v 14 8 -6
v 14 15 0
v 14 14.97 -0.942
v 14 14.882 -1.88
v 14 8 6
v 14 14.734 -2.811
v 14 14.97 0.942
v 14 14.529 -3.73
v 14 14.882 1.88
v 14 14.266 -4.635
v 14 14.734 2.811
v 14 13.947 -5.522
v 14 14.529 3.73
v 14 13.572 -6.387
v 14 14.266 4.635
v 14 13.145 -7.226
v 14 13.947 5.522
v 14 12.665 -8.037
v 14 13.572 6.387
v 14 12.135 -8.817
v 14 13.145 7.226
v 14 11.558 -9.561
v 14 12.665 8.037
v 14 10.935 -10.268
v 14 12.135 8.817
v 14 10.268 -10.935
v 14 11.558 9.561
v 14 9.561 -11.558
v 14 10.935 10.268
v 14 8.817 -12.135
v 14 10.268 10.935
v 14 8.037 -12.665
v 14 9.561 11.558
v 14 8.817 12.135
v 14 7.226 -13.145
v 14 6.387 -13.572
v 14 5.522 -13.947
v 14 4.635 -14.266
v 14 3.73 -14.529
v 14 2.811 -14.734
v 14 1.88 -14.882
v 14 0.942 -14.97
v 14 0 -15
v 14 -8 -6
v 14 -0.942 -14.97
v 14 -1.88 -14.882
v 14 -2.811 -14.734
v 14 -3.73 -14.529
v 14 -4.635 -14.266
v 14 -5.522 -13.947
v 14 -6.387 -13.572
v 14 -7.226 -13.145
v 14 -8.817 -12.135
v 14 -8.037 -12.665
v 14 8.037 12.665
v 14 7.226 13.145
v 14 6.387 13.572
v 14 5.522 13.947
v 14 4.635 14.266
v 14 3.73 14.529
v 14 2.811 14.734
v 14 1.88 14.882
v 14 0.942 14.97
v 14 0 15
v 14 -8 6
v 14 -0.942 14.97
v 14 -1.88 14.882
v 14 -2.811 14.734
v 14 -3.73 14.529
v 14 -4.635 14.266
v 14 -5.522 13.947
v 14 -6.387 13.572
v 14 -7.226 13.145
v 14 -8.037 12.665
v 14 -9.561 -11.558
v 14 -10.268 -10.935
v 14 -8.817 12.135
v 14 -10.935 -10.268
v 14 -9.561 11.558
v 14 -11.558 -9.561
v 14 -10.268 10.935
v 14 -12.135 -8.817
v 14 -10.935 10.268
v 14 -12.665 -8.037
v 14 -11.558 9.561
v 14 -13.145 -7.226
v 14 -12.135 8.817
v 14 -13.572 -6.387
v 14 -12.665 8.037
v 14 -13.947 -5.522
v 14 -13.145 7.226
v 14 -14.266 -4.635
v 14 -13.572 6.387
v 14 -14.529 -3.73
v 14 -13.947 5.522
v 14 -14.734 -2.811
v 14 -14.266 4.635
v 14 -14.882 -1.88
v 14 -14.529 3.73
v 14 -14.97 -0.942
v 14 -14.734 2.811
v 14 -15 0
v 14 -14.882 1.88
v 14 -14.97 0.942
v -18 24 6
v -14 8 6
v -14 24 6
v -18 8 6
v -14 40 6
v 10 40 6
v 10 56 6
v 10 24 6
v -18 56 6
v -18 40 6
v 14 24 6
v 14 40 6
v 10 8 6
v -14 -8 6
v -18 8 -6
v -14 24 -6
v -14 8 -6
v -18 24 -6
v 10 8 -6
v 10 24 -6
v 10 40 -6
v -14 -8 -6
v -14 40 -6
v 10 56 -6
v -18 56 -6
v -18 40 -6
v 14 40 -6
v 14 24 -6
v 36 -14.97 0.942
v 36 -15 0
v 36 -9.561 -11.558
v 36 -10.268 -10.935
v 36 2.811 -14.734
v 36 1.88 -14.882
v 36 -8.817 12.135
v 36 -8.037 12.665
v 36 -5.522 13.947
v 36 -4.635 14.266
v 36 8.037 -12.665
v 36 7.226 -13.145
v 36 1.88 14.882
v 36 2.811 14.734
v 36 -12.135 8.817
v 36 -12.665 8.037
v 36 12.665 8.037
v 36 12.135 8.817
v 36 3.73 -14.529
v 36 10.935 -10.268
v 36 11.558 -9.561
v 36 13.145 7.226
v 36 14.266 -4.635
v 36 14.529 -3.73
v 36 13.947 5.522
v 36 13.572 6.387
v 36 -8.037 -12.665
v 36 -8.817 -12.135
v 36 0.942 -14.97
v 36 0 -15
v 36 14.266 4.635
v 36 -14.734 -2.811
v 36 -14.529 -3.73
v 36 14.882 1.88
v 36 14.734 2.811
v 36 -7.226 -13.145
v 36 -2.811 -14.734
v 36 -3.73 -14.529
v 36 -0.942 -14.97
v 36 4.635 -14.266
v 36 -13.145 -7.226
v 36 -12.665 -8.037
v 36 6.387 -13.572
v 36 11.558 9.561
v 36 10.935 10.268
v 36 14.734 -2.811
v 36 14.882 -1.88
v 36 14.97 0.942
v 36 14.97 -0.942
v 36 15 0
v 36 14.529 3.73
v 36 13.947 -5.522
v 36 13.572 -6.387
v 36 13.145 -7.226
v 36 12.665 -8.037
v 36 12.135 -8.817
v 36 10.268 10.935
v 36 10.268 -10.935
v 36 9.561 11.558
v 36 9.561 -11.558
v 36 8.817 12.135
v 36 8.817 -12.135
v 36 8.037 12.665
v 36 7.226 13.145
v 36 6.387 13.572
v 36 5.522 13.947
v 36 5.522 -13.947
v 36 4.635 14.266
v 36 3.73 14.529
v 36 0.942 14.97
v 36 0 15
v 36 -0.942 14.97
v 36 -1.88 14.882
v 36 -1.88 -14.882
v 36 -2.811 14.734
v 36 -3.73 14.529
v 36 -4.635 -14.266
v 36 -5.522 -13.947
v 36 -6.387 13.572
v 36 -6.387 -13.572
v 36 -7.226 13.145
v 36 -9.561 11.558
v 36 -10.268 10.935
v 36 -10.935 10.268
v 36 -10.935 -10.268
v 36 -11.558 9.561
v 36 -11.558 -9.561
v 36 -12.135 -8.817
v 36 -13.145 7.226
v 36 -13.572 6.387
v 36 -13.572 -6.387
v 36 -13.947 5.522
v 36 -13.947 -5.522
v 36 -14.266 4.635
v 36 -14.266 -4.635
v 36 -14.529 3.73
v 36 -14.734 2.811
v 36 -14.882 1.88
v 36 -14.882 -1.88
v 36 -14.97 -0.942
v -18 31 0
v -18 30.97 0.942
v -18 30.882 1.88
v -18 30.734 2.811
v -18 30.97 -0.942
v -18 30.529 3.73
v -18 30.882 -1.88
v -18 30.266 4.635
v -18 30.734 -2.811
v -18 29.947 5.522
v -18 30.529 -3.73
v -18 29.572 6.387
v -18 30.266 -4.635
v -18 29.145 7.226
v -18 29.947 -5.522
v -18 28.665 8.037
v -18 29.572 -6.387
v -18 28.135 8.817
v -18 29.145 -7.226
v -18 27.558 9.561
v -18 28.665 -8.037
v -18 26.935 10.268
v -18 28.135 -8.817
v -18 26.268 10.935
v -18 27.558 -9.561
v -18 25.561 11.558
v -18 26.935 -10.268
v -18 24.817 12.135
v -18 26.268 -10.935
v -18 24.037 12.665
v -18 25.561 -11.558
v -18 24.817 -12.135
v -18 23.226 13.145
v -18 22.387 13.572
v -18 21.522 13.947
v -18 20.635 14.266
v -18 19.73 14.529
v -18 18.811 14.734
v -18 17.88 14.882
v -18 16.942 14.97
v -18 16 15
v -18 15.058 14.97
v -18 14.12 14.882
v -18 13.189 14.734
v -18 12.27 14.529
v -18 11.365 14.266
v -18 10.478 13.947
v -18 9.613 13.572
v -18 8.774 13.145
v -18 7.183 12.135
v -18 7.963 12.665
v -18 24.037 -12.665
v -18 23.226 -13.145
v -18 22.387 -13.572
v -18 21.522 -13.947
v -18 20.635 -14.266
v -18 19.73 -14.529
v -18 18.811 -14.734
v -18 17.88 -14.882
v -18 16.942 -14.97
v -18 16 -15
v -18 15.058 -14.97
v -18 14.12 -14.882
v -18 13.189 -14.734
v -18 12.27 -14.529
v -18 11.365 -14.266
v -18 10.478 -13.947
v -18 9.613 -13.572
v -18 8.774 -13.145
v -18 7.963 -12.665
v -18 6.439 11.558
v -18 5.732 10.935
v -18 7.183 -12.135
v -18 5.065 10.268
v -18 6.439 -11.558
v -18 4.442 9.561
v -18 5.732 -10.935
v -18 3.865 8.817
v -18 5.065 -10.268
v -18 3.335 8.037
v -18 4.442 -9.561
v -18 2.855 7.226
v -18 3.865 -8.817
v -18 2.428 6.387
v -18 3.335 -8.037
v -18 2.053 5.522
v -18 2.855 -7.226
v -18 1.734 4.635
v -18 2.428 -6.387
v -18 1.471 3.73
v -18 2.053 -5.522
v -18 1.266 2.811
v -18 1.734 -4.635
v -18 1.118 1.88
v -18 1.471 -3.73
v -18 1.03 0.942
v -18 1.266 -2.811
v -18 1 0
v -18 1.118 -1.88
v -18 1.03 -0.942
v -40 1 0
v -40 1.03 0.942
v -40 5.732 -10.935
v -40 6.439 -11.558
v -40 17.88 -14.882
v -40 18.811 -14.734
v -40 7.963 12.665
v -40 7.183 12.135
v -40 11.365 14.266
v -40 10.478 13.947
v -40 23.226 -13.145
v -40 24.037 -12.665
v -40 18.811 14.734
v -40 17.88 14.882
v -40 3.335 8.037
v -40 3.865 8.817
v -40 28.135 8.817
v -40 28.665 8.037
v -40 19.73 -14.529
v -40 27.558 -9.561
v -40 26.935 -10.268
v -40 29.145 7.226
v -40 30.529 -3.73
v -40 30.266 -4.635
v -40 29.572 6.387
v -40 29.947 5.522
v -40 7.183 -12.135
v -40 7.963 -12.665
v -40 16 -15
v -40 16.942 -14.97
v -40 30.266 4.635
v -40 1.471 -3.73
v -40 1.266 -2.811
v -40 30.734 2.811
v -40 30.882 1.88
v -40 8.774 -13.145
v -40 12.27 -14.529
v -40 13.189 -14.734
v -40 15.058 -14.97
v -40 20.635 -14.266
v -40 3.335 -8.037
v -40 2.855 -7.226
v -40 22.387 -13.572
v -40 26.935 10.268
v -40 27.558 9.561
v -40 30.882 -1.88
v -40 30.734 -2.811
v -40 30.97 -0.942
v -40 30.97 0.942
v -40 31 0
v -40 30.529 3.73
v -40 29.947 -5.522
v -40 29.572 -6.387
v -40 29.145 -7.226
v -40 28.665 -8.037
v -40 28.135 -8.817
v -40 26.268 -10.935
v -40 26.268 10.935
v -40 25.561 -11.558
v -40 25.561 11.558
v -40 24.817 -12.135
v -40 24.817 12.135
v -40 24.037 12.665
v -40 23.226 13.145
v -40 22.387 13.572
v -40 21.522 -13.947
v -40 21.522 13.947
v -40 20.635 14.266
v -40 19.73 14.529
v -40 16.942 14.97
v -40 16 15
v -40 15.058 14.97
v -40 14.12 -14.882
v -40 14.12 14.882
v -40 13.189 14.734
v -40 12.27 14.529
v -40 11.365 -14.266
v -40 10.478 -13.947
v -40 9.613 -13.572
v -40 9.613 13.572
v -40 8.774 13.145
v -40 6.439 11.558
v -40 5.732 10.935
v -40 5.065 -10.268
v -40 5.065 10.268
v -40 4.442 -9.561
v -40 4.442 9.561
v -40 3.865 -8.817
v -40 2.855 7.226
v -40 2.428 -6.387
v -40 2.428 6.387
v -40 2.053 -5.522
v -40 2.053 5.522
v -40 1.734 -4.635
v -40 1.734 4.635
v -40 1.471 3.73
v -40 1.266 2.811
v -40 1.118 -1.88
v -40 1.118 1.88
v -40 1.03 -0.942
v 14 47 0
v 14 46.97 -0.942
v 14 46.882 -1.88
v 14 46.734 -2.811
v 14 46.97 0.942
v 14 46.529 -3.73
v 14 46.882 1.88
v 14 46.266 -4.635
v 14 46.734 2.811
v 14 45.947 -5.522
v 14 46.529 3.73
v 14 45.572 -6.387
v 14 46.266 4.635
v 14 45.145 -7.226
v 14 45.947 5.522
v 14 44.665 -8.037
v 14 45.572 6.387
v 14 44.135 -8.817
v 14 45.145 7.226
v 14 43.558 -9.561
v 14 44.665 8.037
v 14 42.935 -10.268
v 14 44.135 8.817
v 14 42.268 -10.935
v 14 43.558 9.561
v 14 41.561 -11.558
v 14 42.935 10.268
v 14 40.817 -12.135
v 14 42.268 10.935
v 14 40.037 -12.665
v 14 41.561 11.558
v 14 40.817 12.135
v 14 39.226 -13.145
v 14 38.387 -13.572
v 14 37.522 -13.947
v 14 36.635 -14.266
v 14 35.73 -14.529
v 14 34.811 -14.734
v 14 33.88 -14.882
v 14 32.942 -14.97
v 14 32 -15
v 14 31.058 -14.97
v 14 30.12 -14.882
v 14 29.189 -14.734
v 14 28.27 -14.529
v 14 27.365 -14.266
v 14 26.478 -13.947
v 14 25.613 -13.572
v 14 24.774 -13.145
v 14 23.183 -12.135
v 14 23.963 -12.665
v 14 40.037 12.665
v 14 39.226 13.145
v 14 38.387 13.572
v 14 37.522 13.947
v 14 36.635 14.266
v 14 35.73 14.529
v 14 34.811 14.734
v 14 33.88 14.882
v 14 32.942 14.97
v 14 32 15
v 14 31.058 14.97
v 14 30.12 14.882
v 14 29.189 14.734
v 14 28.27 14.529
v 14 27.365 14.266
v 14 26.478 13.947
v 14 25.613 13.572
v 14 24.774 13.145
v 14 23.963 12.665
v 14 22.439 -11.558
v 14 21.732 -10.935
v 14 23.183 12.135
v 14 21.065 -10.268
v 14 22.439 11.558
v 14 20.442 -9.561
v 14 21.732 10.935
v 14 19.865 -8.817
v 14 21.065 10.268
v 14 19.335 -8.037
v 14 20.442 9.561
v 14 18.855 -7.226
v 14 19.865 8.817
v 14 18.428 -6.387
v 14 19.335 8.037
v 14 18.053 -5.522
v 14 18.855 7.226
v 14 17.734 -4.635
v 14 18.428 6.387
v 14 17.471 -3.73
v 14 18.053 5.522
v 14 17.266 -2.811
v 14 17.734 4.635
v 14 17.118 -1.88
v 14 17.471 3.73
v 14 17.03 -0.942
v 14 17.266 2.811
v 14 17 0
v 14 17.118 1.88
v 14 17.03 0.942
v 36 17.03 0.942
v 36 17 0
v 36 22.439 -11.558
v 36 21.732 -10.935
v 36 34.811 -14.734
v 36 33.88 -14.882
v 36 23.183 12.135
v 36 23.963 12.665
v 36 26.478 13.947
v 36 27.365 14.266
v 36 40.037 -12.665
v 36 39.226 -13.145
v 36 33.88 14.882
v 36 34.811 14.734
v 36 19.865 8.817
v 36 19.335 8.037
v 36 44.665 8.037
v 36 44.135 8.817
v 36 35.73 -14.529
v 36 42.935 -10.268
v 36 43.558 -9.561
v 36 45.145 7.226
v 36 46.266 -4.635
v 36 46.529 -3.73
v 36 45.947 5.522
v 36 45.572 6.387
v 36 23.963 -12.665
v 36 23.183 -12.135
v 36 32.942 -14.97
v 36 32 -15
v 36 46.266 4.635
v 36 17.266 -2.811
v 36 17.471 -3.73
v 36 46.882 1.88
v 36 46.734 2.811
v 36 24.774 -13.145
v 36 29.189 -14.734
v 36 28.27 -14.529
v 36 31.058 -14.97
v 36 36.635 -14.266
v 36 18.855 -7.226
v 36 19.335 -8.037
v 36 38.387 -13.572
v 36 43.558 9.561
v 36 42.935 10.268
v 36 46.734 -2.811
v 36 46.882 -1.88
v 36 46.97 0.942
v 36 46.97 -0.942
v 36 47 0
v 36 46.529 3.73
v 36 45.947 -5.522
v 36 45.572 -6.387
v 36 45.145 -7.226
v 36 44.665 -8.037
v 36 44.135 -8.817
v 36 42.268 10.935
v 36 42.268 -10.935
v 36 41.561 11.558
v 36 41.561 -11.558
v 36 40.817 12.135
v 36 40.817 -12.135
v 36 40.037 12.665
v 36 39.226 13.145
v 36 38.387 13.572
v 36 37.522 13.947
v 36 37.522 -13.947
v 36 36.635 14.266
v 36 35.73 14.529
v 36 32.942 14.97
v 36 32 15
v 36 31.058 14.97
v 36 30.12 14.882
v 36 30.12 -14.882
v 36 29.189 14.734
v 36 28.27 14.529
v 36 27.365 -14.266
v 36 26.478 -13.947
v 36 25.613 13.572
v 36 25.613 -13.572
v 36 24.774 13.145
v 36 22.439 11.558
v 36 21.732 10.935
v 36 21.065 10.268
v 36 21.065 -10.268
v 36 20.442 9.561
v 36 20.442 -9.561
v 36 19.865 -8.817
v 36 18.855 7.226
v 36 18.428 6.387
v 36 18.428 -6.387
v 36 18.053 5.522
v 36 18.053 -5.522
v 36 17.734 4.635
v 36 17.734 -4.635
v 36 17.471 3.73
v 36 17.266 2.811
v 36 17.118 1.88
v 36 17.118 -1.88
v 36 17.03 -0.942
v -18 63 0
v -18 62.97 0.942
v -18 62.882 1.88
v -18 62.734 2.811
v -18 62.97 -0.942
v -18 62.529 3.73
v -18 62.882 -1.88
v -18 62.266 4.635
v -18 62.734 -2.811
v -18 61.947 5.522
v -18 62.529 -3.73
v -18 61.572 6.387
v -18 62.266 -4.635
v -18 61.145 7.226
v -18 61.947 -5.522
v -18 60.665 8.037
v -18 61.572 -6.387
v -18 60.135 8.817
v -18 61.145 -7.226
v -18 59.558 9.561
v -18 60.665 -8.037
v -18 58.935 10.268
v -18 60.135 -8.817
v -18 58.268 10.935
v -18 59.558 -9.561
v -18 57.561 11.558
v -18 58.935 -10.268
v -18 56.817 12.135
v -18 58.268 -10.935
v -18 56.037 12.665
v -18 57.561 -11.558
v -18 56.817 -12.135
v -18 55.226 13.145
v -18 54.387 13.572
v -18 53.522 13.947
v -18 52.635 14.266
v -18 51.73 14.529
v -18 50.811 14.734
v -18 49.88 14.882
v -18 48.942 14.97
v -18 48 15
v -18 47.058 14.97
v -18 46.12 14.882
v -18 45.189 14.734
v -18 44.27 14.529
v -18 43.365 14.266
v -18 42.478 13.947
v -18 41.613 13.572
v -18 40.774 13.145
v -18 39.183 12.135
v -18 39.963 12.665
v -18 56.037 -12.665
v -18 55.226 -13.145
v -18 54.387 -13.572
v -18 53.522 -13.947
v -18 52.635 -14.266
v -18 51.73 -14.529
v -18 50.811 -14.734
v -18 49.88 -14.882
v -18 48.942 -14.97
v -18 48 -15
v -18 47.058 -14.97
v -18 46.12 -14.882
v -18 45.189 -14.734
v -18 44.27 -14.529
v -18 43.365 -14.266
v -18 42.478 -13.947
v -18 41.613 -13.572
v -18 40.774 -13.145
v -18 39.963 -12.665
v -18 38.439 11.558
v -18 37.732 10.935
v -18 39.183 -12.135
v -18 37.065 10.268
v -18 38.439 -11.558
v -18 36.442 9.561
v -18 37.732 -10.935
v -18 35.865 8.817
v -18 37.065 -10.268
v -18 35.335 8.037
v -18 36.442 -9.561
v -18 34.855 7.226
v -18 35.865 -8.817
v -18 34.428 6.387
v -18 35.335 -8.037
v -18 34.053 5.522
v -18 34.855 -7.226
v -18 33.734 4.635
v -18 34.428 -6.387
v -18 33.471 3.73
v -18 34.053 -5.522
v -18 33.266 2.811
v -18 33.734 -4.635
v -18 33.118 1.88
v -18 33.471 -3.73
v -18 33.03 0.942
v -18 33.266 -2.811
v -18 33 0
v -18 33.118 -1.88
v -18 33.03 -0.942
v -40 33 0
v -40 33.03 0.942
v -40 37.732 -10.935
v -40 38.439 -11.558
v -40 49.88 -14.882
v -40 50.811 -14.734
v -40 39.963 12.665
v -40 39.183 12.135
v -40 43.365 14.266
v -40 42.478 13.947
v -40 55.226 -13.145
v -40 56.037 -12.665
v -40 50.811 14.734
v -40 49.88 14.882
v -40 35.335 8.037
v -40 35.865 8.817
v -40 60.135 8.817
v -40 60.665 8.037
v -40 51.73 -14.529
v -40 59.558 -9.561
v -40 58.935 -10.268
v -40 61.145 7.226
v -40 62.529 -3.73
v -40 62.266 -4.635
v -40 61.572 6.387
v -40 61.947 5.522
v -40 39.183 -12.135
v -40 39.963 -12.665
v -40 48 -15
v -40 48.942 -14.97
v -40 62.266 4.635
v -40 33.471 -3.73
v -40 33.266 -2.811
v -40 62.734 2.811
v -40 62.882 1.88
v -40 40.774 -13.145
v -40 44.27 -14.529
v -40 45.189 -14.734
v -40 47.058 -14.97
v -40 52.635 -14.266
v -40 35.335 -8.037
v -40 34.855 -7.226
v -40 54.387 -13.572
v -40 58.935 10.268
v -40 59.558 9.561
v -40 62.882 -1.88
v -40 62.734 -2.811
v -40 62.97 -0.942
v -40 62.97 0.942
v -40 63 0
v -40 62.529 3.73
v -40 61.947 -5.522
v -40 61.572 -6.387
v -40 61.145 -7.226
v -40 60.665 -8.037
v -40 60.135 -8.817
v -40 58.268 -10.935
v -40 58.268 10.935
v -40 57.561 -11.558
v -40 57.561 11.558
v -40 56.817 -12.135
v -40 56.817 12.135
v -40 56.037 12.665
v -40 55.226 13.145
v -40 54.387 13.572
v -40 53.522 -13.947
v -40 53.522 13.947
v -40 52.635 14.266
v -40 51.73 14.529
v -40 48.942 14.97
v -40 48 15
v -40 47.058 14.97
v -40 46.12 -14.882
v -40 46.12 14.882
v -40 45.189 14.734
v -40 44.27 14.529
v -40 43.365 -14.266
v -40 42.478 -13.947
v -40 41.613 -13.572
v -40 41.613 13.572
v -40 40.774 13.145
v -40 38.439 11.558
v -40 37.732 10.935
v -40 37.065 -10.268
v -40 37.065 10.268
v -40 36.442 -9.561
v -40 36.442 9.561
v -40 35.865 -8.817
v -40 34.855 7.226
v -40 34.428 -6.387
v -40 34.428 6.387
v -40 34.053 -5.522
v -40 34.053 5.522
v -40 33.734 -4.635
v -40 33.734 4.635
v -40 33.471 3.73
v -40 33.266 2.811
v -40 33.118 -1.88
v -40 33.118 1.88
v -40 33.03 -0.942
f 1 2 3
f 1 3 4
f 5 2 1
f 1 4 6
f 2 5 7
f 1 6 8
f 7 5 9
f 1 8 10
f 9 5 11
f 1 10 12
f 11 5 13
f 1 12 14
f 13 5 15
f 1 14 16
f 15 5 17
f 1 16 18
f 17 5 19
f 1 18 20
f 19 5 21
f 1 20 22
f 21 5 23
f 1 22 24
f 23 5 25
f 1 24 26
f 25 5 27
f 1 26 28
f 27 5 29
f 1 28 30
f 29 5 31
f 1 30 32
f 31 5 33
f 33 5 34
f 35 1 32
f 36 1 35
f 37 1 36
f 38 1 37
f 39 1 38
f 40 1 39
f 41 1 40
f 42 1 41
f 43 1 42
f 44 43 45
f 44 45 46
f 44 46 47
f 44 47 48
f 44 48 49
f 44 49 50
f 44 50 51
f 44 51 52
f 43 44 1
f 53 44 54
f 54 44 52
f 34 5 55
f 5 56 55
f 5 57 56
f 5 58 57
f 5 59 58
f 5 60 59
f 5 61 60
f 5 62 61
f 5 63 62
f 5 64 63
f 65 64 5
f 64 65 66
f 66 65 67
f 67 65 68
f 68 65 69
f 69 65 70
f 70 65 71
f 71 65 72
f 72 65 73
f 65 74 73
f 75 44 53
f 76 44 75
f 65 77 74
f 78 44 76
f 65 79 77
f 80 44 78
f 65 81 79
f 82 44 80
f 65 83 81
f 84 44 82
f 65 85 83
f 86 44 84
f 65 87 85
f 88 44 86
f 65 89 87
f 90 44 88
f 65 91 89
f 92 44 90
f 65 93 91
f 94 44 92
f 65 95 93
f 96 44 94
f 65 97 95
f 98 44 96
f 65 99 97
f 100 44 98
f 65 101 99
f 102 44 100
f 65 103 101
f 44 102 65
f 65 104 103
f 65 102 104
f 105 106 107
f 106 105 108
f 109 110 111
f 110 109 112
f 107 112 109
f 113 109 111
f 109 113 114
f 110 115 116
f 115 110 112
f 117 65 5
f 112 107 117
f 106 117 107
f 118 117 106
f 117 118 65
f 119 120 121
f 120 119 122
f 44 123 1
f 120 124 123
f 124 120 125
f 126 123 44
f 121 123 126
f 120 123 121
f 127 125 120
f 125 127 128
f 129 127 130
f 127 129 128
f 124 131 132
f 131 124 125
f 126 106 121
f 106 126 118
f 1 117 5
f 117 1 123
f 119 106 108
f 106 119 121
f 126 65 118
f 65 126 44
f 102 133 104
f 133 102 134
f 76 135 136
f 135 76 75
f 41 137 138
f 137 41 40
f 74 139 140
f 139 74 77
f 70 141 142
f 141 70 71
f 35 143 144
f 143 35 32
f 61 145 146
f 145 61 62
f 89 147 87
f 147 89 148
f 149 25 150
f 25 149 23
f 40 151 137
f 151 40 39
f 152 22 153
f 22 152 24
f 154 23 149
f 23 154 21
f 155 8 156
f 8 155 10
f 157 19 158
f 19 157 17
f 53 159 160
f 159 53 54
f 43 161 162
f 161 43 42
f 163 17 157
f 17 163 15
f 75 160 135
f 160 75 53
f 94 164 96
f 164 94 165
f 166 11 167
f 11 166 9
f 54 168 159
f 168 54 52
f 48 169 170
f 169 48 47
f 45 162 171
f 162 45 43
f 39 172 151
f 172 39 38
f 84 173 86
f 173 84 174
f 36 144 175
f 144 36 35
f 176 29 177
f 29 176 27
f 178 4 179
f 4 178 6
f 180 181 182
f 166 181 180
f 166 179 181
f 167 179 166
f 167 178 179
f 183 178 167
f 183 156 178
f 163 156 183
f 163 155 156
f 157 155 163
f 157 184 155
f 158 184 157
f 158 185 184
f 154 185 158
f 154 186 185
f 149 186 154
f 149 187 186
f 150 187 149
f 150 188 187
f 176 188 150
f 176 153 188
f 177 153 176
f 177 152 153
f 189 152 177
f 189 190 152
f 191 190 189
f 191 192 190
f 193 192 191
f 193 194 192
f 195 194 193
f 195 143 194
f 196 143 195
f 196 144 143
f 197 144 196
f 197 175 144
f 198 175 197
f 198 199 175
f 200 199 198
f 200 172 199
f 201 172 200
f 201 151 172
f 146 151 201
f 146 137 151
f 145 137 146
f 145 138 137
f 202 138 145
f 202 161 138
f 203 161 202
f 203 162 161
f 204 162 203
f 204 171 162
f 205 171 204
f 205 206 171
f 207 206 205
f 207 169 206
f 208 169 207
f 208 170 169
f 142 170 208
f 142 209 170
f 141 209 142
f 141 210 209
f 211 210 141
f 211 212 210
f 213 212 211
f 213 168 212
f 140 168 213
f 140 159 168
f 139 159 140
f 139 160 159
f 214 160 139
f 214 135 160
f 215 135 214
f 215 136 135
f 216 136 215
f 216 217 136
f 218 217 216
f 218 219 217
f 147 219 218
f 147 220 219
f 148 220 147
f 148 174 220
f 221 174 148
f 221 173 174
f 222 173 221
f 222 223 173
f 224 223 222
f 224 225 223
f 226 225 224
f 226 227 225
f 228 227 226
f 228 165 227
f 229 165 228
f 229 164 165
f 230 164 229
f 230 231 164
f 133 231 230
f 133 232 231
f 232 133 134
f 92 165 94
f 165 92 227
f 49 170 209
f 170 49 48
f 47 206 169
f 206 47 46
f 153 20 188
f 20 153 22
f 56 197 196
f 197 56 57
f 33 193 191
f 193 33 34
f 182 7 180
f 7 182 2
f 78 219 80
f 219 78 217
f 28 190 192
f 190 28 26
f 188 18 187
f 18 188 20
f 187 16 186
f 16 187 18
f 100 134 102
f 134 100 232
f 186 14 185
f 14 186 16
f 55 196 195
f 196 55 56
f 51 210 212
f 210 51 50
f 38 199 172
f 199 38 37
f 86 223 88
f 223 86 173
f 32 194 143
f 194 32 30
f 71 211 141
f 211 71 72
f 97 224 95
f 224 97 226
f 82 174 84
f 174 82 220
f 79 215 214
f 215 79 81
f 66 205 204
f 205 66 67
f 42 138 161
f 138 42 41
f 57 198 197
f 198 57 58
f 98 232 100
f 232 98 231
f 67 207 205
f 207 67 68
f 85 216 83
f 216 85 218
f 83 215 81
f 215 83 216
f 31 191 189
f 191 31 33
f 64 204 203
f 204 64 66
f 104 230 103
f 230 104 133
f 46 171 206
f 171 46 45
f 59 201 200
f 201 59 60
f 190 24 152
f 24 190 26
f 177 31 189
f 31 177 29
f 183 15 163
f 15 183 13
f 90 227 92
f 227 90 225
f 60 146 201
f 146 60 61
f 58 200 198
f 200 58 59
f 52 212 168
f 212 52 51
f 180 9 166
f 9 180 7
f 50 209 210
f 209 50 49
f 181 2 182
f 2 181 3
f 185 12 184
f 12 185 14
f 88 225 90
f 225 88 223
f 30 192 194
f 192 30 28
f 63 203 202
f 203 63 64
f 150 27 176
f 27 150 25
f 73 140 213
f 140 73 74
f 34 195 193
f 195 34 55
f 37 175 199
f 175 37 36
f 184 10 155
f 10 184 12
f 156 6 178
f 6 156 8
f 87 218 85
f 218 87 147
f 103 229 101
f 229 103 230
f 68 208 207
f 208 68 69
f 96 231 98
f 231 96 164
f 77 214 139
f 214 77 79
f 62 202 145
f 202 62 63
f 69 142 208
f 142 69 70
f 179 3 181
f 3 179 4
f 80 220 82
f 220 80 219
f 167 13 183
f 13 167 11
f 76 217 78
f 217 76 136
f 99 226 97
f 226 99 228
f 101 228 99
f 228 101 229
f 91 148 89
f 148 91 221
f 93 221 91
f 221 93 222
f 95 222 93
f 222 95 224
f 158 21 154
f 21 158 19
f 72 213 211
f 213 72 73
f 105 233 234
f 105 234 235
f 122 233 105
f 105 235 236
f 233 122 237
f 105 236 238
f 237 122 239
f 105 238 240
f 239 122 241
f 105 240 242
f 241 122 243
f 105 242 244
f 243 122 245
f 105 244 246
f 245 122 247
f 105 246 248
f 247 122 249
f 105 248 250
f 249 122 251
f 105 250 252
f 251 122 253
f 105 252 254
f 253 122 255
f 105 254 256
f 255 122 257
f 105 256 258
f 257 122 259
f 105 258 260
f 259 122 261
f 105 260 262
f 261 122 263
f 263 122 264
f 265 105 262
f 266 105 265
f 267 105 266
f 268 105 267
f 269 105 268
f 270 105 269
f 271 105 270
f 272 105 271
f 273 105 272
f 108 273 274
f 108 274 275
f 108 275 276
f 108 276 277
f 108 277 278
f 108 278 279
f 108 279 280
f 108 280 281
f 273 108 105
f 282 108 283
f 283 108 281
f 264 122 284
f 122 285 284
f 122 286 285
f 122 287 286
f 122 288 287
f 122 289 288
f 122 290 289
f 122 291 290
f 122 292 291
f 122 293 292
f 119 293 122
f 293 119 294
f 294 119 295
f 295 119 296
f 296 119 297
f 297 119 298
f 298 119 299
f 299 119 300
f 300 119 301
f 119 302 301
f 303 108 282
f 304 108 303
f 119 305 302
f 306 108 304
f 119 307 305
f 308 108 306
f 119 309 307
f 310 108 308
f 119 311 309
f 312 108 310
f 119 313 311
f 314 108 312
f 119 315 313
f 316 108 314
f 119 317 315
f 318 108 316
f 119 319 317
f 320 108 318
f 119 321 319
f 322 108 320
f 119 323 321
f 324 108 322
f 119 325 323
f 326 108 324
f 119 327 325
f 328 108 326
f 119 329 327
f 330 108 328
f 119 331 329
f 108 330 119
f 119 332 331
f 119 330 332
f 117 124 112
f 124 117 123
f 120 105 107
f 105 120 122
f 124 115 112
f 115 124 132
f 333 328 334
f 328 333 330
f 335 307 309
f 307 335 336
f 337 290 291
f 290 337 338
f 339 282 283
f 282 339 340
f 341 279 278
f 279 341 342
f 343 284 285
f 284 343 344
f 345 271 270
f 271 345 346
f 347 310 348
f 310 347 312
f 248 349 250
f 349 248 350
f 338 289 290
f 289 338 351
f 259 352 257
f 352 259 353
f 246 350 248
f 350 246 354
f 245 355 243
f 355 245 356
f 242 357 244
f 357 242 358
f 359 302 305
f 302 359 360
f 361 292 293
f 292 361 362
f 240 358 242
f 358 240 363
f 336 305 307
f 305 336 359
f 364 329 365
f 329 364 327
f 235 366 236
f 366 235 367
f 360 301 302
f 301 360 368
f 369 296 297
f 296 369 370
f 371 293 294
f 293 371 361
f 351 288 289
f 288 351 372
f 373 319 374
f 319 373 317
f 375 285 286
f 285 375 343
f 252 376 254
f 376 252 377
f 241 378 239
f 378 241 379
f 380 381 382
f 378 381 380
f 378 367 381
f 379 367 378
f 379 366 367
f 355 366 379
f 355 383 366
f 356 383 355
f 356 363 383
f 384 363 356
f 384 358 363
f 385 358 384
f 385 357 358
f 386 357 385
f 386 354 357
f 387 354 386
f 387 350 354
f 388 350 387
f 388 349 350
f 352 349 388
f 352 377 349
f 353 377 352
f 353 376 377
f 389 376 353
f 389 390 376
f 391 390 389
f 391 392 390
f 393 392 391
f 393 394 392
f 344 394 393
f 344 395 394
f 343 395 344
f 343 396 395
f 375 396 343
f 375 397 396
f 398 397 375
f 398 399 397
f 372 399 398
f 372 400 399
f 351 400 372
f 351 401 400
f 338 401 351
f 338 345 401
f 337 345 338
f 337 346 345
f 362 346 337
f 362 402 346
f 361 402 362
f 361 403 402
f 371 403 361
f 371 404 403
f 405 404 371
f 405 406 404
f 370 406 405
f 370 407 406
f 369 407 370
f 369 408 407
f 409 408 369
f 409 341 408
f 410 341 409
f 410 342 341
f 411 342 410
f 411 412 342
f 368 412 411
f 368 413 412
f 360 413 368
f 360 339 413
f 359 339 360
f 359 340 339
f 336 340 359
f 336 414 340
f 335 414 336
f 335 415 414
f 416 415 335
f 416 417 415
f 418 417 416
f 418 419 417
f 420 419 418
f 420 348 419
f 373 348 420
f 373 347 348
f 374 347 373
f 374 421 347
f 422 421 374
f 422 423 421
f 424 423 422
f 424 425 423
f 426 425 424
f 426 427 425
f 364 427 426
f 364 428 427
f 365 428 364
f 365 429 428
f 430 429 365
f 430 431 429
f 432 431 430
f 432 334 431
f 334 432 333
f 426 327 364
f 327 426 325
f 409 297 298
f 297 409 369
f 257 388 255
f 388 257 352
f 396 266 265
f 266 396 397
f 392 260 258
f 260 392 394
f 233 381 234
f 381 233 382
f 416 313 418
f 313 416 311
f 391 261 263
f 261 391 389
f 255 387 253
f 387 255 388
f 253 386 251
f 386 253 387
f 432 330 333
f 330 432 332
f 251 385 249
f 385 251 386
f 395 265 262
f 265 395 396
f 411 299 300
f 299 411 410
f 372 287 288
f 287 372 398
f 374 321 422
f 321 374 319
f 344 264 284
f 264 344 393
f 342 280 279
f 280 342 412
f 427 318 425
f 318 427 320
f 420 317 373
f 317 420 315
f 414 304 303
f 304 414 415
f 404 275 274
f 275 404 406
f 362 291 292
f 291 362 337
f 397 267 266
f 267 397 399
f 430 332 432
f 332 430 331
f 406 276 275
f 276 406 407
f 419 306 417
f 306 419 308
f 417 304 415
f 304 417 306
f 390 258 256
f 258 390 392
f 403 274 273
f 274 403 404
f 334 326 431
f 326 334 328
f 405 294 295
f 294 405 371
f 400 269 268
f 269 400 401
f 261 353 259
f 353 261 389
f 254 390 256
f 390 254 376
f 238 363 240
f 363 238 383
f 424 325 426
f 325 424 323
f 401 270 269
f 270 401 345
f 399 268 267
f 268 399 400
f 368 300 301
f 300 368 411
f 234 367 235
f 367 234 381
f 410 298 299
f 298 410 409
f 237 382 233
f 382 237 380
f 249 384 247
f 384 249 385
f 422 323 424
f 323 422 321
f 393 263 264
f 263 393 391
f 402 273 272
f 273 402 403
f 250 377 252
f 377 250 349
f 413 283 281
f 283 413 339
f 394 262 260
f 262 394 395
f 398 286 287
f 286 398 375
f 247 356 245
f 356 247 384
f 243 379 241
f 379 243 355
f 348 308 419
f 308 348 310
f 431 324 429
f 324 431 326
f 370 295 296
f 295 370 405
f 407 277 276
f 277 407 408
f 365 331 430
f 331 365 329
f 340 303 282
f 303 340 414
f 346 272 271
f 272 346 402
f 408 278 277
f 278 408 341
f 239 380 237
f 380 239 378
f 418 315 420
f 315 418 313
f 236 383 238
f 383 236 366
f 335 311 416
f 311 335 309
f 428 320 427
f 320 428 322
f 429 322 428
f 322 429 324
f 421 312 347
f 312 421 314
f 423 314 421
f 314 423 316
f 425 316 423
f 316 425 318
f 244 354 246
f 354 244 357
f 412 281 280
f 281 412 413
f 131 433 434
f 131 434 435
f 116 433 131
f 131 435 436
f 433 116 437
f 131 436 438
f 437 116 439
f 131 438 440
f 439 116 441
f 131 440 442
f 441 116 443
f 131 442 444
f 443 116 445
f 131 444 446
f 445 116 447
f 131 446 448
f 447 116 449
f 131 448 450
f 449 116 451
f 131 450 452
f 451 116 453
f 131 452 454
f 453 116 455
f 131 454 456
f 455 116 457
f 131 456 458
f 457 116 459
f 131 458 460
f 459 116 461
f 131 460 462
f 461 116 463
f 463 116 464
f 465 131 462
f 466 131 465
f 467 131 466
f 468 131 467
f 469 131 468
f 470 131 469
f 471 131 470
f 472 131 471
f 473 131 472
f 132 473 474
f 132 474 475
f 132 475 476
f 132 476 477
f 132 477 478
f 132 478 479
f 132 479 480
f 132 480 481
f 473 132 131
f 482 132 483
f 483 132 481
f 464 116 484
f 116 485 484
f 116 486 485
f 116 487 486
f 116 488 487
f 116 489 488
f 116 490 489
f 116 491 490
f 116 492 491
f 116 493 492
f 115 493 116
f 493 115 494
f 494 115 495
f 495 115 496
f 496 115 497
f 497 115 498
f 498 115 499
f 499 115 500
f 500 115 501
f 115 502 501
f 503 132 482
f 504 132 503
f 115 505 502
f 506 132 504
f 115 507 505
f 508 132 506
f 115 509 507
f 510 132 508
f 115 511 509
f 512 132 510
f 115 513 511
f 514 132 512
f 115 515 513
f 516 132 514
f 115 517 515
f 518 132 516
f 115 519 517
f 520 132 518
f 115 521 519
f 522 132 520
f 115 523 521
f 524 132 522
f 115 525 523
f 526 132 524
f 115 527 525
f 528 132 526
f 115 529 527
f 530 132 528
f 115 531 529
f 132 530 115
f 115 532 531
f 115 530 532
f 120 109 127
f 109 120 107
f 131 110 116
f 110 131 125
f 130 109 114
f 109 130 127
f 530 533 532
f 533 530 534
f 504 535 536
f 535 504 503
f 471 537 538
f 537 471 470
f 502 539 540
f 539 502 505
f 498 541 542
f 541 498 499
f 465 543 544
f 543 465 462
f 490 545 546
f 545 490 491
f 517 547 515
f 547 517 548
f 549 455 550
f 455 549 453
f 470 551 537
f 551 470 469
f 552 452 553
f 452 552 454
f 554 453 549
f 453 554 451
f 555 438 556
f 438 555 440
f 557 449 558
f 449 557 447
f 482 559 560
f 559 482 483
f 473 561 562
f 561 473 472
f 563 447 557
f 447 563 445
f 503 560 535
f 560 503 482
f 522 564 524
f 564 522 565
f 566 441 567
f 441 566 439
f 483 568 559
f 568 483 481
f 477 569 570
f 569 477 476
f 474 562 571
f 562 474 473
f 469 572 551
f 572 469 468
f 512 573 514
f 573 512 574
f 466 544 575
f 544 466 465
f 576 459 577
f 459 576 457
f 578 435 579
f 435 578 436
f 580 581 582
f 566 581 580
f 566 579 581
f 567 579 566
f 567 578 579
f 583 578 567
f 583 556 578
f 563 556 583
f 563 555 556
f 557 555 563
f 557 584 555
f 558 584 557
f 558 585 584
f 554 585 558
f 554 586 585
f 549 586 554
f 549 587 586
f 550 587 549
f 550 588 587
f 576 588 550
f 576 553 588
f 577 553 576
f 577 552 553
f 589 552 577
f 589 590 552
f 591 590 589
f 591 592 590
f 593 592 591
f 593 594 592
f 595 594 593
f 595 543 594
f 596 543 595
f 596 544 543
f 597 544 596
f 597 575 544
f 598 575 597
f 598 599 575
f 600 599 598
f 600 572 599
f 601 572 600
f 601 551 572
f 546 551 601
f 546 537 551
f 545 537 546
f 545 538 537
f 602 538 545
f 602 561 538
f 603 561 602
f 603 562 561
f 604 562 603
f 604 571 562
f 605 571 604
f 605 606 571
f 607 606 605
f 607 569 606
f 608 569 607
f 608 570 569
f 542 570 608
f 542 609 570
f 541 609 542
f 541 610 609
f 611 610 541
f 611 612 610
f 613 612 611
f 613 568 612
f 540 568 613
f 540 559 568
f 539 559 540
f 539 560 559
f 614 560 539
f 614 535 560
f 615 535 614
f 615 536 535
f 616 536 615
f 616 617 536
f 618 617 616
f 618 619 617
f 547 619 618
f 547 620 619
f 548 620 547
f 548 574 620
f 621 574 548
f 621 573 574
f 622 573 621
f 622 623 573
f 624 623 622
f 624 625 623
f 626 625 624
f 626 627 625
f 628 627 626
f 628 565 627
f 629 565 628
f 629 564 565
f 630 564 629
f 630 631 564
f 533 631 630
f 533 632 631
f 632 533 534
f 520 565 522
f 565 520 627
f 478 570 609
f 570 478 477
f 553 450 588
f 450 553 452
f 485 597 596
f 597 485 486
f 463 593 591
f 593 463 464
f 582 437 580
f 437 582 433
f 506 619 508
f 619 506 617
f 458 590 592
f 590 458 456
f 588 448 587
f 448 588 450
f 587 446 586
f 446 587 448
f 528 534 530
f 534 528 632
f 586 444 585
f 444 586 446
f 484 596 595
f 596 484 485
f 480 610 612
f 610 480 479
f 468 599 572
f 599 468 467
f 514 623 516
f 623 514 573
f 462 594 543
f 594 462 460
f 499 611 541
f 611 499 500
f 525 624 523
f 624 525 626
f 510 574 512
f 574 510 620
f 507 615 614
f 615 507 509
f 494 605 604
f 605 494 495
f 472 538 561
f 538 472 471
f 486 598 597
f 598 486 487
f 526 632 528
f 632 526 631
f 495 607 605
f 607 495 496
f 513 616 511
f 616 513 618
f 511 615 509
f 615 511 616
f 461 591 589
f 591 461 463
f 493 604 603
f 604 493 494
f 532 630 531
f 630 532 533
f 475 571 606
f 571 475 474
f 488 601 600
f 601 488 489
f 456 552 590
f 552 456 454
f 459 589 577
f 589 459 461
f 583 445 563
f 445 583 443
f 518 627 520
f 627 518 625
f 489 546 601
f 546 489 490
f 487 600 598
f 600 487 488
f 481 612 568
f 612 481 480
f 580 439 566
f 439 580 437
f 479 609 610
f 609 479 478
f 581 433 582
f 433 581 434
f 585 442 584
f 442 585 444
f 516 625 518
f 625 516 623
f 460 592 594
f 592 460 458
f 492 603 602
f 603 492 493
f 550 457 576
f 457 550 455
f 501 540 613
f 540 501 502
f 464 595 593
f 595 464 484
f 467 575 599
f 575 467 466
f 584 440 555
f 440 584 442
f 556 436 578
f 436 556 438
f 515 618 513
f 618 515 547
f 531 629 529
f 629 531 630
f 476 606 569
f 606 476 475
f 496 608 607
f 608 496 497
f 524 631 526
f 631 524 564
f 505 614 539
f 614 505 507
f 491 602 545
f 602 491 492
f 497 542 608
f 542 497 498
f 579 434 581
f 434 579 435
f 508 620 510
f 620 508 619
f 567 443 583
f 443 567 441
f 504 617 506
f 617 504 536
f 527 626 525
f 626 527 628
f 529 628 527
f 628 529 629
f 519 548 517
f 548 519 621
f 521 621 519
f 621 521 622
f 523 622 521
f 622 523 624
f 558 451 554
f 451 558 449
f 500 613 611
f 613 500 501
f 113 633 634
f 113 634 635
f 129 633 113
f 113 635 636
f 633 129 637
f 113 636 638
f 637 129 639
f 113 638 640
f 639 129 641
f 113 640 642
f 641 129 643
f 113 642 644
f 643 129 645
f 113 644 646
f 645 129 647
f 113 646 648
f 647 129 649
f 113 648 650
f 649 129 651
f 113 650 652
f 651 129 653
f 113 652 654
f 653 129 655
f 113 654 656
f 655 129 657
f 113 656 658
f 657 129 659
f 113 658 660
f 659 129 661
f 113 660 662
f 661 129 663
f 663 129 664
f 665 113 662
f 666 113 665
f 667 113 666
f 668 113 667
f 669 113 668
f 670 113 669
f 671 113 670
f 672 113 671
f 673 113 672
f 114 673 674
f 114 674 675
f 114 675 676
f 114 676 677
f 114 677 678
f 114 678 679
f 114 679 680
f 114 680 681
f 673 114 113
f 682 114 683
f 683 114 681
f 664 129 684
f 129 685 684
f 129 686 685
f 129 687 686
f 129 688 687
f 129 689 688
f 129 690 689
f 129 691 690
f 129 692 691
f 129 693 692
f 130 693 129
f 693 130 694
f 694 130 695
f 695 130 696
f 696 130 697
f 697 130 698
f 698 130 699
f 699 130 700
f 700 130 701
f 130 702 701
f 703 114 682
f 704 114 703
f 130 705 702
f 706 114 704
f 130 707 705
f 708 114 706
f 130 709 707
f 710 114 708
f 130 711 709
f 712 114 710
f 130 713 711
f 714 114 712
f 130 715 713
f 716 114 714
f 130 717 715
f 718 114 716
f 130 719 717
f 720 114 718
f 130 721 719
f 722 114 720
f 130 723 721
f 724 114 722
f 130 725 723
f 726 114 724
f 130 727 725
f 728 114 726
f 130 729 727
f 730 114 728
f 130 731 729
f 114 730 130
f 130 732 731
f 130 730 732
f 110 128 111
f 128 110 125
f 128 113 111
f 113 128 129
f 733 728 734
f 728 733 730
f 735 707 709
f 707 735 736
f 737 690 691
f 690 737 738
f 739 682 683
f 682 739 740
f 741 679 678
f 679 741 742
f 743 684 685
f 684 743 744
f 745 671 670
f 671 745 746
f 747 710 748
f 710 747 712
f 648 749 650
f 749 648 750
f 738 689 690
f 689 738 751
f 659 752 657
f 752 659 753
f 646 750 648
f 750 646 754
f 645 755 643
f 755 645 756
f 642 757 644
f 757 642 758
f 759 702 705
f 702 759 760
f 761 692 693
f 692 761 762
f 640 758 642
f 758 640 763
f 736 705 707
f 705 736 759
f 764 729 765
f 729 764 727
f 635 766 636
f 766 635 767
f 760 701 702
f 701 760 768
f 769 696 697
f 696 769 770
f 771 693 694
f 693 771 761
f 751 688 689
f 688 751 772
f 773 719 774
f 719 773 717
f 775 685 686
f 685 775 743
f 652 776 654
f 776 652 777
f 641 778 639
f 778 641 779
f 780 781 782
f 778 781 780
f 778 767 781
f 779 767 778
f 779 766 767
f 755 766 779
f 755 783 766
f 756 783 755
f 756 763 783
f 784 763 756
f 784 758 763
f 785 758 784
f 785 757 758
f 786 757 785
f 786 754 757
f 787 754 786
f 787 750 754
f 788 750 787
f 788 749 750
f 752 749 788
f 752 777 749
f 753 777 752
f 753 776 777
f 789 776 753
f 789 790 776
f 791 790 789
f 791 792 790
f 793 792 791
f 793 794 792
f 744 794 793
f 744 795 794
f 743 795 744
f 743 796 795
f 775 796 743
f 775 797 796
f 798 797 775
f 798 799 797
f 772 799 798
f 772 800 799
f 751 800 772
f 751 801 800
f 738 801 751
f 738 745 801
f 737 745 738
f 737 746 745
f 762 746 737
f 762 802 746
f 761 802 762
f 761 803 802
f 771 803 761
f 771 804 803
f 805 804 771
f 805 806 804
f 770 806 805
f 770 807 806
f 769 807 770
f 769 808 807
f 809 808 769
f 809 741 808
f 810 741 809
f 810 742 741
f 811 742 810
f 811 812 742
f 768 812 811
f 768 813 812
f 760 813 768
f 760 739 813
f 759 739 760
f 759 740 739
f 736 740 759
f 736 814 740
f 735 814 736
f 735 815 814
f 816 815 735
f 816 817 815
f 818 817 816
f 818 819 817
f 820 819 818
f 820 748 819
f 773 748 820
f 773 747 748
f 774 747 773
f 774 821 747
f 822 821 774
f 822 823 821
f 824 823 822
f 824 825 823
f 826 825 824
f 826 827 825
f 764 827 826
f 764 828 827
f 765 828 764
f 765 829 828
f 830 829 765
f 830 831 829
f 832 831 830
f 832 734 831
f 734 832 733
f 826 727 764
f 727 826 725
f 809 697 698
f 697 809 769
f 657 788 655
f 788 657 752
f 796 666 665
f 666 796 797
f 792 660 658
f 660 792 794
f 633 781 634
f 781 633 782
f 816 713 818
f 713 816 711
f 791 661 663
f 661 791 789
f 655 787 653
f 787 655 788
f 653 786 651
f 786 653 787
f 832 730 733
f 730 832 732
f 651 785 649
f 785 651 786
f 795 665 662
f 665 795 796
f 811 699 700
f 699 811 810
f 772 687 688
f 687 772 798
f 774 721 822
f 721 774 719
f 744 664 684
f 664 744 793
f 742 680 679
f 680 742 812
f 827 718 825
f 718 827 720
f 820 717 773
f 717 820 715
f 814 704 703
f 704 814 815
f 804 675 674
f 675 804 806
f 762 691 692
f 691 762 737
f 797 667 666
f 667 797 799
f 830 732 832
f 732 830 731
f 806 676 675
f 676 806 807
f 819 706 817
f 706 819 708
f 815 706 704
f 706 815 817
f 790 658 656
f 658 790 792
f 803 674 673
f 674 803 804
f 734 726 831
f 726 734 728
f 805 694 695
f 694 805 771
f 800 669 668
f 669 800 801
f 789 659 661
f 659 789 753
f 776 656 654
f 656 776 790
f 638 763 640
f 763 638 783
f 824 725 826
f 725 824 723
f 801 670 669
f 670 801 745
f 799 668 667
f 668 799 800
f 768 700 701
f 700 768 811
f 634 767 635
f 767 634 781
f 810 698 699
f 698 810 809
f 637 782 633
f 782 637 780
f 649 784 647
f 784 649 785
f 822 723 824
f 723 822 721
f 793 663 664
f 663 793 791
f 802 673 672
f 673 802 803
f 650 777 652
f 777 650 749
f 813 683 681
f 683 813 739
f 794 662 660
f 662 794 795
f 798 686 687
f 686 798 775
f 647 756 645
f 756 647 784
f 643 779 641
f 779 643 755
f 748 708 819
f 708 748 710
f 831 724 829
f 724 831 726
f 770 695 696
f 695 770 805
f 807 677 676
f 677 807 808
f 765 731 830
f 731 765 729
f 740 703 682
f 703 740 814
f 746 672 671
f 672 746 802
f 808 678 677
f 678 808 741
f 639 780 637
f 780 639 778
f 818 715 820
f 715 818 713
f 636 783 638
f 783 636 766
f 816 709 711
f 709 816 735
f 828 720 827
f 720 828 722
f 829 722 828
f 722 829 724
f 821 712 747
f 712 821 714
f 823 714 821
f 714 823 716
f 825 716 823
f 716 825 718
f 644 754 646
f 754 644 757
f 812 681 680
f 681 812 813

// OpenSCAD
// SumoBot by Rafi Khan

// Maximum
parts();

module parts() {
    // Motors
    wiring_tolerance = 4;
    // R1
    motorAssembly();
    
    // L1
    translate([-wiring_tolerance, 16, 0]) {
        mirror([1, 0, 0]) {
            motorAssembly();
        }
    }
    
    // R2
    translate([0, 32, 0]) {
        motorAssembly();
    }
    
    // L2
    translate([-wiring_tolerance, 48, 0]) {
        mirror([1, 0, 0]) {
            motorAssembly();
        }
    }
}

module motorAssembly() {
    // Motor with wiring and tolerance..?
    width = 28;
    height = 22;
    move =  (width / 2) - (height / 2) + height;

    //echo(move)
    
    color([168/255, 171/255, 175/255,1]) {
        cube([width, 16, 12], center=true);
    }
    
    
    // Wheel
    $fn=100;
    translate([move, 0, 0]) {
        rotate([0, 90, 0]) {
            color([1, 0, 0, 1]) {
                cylinder(h = height, r = 15, center=true);
            }
        }
    }
}

module box() {
    cube(100);
}
